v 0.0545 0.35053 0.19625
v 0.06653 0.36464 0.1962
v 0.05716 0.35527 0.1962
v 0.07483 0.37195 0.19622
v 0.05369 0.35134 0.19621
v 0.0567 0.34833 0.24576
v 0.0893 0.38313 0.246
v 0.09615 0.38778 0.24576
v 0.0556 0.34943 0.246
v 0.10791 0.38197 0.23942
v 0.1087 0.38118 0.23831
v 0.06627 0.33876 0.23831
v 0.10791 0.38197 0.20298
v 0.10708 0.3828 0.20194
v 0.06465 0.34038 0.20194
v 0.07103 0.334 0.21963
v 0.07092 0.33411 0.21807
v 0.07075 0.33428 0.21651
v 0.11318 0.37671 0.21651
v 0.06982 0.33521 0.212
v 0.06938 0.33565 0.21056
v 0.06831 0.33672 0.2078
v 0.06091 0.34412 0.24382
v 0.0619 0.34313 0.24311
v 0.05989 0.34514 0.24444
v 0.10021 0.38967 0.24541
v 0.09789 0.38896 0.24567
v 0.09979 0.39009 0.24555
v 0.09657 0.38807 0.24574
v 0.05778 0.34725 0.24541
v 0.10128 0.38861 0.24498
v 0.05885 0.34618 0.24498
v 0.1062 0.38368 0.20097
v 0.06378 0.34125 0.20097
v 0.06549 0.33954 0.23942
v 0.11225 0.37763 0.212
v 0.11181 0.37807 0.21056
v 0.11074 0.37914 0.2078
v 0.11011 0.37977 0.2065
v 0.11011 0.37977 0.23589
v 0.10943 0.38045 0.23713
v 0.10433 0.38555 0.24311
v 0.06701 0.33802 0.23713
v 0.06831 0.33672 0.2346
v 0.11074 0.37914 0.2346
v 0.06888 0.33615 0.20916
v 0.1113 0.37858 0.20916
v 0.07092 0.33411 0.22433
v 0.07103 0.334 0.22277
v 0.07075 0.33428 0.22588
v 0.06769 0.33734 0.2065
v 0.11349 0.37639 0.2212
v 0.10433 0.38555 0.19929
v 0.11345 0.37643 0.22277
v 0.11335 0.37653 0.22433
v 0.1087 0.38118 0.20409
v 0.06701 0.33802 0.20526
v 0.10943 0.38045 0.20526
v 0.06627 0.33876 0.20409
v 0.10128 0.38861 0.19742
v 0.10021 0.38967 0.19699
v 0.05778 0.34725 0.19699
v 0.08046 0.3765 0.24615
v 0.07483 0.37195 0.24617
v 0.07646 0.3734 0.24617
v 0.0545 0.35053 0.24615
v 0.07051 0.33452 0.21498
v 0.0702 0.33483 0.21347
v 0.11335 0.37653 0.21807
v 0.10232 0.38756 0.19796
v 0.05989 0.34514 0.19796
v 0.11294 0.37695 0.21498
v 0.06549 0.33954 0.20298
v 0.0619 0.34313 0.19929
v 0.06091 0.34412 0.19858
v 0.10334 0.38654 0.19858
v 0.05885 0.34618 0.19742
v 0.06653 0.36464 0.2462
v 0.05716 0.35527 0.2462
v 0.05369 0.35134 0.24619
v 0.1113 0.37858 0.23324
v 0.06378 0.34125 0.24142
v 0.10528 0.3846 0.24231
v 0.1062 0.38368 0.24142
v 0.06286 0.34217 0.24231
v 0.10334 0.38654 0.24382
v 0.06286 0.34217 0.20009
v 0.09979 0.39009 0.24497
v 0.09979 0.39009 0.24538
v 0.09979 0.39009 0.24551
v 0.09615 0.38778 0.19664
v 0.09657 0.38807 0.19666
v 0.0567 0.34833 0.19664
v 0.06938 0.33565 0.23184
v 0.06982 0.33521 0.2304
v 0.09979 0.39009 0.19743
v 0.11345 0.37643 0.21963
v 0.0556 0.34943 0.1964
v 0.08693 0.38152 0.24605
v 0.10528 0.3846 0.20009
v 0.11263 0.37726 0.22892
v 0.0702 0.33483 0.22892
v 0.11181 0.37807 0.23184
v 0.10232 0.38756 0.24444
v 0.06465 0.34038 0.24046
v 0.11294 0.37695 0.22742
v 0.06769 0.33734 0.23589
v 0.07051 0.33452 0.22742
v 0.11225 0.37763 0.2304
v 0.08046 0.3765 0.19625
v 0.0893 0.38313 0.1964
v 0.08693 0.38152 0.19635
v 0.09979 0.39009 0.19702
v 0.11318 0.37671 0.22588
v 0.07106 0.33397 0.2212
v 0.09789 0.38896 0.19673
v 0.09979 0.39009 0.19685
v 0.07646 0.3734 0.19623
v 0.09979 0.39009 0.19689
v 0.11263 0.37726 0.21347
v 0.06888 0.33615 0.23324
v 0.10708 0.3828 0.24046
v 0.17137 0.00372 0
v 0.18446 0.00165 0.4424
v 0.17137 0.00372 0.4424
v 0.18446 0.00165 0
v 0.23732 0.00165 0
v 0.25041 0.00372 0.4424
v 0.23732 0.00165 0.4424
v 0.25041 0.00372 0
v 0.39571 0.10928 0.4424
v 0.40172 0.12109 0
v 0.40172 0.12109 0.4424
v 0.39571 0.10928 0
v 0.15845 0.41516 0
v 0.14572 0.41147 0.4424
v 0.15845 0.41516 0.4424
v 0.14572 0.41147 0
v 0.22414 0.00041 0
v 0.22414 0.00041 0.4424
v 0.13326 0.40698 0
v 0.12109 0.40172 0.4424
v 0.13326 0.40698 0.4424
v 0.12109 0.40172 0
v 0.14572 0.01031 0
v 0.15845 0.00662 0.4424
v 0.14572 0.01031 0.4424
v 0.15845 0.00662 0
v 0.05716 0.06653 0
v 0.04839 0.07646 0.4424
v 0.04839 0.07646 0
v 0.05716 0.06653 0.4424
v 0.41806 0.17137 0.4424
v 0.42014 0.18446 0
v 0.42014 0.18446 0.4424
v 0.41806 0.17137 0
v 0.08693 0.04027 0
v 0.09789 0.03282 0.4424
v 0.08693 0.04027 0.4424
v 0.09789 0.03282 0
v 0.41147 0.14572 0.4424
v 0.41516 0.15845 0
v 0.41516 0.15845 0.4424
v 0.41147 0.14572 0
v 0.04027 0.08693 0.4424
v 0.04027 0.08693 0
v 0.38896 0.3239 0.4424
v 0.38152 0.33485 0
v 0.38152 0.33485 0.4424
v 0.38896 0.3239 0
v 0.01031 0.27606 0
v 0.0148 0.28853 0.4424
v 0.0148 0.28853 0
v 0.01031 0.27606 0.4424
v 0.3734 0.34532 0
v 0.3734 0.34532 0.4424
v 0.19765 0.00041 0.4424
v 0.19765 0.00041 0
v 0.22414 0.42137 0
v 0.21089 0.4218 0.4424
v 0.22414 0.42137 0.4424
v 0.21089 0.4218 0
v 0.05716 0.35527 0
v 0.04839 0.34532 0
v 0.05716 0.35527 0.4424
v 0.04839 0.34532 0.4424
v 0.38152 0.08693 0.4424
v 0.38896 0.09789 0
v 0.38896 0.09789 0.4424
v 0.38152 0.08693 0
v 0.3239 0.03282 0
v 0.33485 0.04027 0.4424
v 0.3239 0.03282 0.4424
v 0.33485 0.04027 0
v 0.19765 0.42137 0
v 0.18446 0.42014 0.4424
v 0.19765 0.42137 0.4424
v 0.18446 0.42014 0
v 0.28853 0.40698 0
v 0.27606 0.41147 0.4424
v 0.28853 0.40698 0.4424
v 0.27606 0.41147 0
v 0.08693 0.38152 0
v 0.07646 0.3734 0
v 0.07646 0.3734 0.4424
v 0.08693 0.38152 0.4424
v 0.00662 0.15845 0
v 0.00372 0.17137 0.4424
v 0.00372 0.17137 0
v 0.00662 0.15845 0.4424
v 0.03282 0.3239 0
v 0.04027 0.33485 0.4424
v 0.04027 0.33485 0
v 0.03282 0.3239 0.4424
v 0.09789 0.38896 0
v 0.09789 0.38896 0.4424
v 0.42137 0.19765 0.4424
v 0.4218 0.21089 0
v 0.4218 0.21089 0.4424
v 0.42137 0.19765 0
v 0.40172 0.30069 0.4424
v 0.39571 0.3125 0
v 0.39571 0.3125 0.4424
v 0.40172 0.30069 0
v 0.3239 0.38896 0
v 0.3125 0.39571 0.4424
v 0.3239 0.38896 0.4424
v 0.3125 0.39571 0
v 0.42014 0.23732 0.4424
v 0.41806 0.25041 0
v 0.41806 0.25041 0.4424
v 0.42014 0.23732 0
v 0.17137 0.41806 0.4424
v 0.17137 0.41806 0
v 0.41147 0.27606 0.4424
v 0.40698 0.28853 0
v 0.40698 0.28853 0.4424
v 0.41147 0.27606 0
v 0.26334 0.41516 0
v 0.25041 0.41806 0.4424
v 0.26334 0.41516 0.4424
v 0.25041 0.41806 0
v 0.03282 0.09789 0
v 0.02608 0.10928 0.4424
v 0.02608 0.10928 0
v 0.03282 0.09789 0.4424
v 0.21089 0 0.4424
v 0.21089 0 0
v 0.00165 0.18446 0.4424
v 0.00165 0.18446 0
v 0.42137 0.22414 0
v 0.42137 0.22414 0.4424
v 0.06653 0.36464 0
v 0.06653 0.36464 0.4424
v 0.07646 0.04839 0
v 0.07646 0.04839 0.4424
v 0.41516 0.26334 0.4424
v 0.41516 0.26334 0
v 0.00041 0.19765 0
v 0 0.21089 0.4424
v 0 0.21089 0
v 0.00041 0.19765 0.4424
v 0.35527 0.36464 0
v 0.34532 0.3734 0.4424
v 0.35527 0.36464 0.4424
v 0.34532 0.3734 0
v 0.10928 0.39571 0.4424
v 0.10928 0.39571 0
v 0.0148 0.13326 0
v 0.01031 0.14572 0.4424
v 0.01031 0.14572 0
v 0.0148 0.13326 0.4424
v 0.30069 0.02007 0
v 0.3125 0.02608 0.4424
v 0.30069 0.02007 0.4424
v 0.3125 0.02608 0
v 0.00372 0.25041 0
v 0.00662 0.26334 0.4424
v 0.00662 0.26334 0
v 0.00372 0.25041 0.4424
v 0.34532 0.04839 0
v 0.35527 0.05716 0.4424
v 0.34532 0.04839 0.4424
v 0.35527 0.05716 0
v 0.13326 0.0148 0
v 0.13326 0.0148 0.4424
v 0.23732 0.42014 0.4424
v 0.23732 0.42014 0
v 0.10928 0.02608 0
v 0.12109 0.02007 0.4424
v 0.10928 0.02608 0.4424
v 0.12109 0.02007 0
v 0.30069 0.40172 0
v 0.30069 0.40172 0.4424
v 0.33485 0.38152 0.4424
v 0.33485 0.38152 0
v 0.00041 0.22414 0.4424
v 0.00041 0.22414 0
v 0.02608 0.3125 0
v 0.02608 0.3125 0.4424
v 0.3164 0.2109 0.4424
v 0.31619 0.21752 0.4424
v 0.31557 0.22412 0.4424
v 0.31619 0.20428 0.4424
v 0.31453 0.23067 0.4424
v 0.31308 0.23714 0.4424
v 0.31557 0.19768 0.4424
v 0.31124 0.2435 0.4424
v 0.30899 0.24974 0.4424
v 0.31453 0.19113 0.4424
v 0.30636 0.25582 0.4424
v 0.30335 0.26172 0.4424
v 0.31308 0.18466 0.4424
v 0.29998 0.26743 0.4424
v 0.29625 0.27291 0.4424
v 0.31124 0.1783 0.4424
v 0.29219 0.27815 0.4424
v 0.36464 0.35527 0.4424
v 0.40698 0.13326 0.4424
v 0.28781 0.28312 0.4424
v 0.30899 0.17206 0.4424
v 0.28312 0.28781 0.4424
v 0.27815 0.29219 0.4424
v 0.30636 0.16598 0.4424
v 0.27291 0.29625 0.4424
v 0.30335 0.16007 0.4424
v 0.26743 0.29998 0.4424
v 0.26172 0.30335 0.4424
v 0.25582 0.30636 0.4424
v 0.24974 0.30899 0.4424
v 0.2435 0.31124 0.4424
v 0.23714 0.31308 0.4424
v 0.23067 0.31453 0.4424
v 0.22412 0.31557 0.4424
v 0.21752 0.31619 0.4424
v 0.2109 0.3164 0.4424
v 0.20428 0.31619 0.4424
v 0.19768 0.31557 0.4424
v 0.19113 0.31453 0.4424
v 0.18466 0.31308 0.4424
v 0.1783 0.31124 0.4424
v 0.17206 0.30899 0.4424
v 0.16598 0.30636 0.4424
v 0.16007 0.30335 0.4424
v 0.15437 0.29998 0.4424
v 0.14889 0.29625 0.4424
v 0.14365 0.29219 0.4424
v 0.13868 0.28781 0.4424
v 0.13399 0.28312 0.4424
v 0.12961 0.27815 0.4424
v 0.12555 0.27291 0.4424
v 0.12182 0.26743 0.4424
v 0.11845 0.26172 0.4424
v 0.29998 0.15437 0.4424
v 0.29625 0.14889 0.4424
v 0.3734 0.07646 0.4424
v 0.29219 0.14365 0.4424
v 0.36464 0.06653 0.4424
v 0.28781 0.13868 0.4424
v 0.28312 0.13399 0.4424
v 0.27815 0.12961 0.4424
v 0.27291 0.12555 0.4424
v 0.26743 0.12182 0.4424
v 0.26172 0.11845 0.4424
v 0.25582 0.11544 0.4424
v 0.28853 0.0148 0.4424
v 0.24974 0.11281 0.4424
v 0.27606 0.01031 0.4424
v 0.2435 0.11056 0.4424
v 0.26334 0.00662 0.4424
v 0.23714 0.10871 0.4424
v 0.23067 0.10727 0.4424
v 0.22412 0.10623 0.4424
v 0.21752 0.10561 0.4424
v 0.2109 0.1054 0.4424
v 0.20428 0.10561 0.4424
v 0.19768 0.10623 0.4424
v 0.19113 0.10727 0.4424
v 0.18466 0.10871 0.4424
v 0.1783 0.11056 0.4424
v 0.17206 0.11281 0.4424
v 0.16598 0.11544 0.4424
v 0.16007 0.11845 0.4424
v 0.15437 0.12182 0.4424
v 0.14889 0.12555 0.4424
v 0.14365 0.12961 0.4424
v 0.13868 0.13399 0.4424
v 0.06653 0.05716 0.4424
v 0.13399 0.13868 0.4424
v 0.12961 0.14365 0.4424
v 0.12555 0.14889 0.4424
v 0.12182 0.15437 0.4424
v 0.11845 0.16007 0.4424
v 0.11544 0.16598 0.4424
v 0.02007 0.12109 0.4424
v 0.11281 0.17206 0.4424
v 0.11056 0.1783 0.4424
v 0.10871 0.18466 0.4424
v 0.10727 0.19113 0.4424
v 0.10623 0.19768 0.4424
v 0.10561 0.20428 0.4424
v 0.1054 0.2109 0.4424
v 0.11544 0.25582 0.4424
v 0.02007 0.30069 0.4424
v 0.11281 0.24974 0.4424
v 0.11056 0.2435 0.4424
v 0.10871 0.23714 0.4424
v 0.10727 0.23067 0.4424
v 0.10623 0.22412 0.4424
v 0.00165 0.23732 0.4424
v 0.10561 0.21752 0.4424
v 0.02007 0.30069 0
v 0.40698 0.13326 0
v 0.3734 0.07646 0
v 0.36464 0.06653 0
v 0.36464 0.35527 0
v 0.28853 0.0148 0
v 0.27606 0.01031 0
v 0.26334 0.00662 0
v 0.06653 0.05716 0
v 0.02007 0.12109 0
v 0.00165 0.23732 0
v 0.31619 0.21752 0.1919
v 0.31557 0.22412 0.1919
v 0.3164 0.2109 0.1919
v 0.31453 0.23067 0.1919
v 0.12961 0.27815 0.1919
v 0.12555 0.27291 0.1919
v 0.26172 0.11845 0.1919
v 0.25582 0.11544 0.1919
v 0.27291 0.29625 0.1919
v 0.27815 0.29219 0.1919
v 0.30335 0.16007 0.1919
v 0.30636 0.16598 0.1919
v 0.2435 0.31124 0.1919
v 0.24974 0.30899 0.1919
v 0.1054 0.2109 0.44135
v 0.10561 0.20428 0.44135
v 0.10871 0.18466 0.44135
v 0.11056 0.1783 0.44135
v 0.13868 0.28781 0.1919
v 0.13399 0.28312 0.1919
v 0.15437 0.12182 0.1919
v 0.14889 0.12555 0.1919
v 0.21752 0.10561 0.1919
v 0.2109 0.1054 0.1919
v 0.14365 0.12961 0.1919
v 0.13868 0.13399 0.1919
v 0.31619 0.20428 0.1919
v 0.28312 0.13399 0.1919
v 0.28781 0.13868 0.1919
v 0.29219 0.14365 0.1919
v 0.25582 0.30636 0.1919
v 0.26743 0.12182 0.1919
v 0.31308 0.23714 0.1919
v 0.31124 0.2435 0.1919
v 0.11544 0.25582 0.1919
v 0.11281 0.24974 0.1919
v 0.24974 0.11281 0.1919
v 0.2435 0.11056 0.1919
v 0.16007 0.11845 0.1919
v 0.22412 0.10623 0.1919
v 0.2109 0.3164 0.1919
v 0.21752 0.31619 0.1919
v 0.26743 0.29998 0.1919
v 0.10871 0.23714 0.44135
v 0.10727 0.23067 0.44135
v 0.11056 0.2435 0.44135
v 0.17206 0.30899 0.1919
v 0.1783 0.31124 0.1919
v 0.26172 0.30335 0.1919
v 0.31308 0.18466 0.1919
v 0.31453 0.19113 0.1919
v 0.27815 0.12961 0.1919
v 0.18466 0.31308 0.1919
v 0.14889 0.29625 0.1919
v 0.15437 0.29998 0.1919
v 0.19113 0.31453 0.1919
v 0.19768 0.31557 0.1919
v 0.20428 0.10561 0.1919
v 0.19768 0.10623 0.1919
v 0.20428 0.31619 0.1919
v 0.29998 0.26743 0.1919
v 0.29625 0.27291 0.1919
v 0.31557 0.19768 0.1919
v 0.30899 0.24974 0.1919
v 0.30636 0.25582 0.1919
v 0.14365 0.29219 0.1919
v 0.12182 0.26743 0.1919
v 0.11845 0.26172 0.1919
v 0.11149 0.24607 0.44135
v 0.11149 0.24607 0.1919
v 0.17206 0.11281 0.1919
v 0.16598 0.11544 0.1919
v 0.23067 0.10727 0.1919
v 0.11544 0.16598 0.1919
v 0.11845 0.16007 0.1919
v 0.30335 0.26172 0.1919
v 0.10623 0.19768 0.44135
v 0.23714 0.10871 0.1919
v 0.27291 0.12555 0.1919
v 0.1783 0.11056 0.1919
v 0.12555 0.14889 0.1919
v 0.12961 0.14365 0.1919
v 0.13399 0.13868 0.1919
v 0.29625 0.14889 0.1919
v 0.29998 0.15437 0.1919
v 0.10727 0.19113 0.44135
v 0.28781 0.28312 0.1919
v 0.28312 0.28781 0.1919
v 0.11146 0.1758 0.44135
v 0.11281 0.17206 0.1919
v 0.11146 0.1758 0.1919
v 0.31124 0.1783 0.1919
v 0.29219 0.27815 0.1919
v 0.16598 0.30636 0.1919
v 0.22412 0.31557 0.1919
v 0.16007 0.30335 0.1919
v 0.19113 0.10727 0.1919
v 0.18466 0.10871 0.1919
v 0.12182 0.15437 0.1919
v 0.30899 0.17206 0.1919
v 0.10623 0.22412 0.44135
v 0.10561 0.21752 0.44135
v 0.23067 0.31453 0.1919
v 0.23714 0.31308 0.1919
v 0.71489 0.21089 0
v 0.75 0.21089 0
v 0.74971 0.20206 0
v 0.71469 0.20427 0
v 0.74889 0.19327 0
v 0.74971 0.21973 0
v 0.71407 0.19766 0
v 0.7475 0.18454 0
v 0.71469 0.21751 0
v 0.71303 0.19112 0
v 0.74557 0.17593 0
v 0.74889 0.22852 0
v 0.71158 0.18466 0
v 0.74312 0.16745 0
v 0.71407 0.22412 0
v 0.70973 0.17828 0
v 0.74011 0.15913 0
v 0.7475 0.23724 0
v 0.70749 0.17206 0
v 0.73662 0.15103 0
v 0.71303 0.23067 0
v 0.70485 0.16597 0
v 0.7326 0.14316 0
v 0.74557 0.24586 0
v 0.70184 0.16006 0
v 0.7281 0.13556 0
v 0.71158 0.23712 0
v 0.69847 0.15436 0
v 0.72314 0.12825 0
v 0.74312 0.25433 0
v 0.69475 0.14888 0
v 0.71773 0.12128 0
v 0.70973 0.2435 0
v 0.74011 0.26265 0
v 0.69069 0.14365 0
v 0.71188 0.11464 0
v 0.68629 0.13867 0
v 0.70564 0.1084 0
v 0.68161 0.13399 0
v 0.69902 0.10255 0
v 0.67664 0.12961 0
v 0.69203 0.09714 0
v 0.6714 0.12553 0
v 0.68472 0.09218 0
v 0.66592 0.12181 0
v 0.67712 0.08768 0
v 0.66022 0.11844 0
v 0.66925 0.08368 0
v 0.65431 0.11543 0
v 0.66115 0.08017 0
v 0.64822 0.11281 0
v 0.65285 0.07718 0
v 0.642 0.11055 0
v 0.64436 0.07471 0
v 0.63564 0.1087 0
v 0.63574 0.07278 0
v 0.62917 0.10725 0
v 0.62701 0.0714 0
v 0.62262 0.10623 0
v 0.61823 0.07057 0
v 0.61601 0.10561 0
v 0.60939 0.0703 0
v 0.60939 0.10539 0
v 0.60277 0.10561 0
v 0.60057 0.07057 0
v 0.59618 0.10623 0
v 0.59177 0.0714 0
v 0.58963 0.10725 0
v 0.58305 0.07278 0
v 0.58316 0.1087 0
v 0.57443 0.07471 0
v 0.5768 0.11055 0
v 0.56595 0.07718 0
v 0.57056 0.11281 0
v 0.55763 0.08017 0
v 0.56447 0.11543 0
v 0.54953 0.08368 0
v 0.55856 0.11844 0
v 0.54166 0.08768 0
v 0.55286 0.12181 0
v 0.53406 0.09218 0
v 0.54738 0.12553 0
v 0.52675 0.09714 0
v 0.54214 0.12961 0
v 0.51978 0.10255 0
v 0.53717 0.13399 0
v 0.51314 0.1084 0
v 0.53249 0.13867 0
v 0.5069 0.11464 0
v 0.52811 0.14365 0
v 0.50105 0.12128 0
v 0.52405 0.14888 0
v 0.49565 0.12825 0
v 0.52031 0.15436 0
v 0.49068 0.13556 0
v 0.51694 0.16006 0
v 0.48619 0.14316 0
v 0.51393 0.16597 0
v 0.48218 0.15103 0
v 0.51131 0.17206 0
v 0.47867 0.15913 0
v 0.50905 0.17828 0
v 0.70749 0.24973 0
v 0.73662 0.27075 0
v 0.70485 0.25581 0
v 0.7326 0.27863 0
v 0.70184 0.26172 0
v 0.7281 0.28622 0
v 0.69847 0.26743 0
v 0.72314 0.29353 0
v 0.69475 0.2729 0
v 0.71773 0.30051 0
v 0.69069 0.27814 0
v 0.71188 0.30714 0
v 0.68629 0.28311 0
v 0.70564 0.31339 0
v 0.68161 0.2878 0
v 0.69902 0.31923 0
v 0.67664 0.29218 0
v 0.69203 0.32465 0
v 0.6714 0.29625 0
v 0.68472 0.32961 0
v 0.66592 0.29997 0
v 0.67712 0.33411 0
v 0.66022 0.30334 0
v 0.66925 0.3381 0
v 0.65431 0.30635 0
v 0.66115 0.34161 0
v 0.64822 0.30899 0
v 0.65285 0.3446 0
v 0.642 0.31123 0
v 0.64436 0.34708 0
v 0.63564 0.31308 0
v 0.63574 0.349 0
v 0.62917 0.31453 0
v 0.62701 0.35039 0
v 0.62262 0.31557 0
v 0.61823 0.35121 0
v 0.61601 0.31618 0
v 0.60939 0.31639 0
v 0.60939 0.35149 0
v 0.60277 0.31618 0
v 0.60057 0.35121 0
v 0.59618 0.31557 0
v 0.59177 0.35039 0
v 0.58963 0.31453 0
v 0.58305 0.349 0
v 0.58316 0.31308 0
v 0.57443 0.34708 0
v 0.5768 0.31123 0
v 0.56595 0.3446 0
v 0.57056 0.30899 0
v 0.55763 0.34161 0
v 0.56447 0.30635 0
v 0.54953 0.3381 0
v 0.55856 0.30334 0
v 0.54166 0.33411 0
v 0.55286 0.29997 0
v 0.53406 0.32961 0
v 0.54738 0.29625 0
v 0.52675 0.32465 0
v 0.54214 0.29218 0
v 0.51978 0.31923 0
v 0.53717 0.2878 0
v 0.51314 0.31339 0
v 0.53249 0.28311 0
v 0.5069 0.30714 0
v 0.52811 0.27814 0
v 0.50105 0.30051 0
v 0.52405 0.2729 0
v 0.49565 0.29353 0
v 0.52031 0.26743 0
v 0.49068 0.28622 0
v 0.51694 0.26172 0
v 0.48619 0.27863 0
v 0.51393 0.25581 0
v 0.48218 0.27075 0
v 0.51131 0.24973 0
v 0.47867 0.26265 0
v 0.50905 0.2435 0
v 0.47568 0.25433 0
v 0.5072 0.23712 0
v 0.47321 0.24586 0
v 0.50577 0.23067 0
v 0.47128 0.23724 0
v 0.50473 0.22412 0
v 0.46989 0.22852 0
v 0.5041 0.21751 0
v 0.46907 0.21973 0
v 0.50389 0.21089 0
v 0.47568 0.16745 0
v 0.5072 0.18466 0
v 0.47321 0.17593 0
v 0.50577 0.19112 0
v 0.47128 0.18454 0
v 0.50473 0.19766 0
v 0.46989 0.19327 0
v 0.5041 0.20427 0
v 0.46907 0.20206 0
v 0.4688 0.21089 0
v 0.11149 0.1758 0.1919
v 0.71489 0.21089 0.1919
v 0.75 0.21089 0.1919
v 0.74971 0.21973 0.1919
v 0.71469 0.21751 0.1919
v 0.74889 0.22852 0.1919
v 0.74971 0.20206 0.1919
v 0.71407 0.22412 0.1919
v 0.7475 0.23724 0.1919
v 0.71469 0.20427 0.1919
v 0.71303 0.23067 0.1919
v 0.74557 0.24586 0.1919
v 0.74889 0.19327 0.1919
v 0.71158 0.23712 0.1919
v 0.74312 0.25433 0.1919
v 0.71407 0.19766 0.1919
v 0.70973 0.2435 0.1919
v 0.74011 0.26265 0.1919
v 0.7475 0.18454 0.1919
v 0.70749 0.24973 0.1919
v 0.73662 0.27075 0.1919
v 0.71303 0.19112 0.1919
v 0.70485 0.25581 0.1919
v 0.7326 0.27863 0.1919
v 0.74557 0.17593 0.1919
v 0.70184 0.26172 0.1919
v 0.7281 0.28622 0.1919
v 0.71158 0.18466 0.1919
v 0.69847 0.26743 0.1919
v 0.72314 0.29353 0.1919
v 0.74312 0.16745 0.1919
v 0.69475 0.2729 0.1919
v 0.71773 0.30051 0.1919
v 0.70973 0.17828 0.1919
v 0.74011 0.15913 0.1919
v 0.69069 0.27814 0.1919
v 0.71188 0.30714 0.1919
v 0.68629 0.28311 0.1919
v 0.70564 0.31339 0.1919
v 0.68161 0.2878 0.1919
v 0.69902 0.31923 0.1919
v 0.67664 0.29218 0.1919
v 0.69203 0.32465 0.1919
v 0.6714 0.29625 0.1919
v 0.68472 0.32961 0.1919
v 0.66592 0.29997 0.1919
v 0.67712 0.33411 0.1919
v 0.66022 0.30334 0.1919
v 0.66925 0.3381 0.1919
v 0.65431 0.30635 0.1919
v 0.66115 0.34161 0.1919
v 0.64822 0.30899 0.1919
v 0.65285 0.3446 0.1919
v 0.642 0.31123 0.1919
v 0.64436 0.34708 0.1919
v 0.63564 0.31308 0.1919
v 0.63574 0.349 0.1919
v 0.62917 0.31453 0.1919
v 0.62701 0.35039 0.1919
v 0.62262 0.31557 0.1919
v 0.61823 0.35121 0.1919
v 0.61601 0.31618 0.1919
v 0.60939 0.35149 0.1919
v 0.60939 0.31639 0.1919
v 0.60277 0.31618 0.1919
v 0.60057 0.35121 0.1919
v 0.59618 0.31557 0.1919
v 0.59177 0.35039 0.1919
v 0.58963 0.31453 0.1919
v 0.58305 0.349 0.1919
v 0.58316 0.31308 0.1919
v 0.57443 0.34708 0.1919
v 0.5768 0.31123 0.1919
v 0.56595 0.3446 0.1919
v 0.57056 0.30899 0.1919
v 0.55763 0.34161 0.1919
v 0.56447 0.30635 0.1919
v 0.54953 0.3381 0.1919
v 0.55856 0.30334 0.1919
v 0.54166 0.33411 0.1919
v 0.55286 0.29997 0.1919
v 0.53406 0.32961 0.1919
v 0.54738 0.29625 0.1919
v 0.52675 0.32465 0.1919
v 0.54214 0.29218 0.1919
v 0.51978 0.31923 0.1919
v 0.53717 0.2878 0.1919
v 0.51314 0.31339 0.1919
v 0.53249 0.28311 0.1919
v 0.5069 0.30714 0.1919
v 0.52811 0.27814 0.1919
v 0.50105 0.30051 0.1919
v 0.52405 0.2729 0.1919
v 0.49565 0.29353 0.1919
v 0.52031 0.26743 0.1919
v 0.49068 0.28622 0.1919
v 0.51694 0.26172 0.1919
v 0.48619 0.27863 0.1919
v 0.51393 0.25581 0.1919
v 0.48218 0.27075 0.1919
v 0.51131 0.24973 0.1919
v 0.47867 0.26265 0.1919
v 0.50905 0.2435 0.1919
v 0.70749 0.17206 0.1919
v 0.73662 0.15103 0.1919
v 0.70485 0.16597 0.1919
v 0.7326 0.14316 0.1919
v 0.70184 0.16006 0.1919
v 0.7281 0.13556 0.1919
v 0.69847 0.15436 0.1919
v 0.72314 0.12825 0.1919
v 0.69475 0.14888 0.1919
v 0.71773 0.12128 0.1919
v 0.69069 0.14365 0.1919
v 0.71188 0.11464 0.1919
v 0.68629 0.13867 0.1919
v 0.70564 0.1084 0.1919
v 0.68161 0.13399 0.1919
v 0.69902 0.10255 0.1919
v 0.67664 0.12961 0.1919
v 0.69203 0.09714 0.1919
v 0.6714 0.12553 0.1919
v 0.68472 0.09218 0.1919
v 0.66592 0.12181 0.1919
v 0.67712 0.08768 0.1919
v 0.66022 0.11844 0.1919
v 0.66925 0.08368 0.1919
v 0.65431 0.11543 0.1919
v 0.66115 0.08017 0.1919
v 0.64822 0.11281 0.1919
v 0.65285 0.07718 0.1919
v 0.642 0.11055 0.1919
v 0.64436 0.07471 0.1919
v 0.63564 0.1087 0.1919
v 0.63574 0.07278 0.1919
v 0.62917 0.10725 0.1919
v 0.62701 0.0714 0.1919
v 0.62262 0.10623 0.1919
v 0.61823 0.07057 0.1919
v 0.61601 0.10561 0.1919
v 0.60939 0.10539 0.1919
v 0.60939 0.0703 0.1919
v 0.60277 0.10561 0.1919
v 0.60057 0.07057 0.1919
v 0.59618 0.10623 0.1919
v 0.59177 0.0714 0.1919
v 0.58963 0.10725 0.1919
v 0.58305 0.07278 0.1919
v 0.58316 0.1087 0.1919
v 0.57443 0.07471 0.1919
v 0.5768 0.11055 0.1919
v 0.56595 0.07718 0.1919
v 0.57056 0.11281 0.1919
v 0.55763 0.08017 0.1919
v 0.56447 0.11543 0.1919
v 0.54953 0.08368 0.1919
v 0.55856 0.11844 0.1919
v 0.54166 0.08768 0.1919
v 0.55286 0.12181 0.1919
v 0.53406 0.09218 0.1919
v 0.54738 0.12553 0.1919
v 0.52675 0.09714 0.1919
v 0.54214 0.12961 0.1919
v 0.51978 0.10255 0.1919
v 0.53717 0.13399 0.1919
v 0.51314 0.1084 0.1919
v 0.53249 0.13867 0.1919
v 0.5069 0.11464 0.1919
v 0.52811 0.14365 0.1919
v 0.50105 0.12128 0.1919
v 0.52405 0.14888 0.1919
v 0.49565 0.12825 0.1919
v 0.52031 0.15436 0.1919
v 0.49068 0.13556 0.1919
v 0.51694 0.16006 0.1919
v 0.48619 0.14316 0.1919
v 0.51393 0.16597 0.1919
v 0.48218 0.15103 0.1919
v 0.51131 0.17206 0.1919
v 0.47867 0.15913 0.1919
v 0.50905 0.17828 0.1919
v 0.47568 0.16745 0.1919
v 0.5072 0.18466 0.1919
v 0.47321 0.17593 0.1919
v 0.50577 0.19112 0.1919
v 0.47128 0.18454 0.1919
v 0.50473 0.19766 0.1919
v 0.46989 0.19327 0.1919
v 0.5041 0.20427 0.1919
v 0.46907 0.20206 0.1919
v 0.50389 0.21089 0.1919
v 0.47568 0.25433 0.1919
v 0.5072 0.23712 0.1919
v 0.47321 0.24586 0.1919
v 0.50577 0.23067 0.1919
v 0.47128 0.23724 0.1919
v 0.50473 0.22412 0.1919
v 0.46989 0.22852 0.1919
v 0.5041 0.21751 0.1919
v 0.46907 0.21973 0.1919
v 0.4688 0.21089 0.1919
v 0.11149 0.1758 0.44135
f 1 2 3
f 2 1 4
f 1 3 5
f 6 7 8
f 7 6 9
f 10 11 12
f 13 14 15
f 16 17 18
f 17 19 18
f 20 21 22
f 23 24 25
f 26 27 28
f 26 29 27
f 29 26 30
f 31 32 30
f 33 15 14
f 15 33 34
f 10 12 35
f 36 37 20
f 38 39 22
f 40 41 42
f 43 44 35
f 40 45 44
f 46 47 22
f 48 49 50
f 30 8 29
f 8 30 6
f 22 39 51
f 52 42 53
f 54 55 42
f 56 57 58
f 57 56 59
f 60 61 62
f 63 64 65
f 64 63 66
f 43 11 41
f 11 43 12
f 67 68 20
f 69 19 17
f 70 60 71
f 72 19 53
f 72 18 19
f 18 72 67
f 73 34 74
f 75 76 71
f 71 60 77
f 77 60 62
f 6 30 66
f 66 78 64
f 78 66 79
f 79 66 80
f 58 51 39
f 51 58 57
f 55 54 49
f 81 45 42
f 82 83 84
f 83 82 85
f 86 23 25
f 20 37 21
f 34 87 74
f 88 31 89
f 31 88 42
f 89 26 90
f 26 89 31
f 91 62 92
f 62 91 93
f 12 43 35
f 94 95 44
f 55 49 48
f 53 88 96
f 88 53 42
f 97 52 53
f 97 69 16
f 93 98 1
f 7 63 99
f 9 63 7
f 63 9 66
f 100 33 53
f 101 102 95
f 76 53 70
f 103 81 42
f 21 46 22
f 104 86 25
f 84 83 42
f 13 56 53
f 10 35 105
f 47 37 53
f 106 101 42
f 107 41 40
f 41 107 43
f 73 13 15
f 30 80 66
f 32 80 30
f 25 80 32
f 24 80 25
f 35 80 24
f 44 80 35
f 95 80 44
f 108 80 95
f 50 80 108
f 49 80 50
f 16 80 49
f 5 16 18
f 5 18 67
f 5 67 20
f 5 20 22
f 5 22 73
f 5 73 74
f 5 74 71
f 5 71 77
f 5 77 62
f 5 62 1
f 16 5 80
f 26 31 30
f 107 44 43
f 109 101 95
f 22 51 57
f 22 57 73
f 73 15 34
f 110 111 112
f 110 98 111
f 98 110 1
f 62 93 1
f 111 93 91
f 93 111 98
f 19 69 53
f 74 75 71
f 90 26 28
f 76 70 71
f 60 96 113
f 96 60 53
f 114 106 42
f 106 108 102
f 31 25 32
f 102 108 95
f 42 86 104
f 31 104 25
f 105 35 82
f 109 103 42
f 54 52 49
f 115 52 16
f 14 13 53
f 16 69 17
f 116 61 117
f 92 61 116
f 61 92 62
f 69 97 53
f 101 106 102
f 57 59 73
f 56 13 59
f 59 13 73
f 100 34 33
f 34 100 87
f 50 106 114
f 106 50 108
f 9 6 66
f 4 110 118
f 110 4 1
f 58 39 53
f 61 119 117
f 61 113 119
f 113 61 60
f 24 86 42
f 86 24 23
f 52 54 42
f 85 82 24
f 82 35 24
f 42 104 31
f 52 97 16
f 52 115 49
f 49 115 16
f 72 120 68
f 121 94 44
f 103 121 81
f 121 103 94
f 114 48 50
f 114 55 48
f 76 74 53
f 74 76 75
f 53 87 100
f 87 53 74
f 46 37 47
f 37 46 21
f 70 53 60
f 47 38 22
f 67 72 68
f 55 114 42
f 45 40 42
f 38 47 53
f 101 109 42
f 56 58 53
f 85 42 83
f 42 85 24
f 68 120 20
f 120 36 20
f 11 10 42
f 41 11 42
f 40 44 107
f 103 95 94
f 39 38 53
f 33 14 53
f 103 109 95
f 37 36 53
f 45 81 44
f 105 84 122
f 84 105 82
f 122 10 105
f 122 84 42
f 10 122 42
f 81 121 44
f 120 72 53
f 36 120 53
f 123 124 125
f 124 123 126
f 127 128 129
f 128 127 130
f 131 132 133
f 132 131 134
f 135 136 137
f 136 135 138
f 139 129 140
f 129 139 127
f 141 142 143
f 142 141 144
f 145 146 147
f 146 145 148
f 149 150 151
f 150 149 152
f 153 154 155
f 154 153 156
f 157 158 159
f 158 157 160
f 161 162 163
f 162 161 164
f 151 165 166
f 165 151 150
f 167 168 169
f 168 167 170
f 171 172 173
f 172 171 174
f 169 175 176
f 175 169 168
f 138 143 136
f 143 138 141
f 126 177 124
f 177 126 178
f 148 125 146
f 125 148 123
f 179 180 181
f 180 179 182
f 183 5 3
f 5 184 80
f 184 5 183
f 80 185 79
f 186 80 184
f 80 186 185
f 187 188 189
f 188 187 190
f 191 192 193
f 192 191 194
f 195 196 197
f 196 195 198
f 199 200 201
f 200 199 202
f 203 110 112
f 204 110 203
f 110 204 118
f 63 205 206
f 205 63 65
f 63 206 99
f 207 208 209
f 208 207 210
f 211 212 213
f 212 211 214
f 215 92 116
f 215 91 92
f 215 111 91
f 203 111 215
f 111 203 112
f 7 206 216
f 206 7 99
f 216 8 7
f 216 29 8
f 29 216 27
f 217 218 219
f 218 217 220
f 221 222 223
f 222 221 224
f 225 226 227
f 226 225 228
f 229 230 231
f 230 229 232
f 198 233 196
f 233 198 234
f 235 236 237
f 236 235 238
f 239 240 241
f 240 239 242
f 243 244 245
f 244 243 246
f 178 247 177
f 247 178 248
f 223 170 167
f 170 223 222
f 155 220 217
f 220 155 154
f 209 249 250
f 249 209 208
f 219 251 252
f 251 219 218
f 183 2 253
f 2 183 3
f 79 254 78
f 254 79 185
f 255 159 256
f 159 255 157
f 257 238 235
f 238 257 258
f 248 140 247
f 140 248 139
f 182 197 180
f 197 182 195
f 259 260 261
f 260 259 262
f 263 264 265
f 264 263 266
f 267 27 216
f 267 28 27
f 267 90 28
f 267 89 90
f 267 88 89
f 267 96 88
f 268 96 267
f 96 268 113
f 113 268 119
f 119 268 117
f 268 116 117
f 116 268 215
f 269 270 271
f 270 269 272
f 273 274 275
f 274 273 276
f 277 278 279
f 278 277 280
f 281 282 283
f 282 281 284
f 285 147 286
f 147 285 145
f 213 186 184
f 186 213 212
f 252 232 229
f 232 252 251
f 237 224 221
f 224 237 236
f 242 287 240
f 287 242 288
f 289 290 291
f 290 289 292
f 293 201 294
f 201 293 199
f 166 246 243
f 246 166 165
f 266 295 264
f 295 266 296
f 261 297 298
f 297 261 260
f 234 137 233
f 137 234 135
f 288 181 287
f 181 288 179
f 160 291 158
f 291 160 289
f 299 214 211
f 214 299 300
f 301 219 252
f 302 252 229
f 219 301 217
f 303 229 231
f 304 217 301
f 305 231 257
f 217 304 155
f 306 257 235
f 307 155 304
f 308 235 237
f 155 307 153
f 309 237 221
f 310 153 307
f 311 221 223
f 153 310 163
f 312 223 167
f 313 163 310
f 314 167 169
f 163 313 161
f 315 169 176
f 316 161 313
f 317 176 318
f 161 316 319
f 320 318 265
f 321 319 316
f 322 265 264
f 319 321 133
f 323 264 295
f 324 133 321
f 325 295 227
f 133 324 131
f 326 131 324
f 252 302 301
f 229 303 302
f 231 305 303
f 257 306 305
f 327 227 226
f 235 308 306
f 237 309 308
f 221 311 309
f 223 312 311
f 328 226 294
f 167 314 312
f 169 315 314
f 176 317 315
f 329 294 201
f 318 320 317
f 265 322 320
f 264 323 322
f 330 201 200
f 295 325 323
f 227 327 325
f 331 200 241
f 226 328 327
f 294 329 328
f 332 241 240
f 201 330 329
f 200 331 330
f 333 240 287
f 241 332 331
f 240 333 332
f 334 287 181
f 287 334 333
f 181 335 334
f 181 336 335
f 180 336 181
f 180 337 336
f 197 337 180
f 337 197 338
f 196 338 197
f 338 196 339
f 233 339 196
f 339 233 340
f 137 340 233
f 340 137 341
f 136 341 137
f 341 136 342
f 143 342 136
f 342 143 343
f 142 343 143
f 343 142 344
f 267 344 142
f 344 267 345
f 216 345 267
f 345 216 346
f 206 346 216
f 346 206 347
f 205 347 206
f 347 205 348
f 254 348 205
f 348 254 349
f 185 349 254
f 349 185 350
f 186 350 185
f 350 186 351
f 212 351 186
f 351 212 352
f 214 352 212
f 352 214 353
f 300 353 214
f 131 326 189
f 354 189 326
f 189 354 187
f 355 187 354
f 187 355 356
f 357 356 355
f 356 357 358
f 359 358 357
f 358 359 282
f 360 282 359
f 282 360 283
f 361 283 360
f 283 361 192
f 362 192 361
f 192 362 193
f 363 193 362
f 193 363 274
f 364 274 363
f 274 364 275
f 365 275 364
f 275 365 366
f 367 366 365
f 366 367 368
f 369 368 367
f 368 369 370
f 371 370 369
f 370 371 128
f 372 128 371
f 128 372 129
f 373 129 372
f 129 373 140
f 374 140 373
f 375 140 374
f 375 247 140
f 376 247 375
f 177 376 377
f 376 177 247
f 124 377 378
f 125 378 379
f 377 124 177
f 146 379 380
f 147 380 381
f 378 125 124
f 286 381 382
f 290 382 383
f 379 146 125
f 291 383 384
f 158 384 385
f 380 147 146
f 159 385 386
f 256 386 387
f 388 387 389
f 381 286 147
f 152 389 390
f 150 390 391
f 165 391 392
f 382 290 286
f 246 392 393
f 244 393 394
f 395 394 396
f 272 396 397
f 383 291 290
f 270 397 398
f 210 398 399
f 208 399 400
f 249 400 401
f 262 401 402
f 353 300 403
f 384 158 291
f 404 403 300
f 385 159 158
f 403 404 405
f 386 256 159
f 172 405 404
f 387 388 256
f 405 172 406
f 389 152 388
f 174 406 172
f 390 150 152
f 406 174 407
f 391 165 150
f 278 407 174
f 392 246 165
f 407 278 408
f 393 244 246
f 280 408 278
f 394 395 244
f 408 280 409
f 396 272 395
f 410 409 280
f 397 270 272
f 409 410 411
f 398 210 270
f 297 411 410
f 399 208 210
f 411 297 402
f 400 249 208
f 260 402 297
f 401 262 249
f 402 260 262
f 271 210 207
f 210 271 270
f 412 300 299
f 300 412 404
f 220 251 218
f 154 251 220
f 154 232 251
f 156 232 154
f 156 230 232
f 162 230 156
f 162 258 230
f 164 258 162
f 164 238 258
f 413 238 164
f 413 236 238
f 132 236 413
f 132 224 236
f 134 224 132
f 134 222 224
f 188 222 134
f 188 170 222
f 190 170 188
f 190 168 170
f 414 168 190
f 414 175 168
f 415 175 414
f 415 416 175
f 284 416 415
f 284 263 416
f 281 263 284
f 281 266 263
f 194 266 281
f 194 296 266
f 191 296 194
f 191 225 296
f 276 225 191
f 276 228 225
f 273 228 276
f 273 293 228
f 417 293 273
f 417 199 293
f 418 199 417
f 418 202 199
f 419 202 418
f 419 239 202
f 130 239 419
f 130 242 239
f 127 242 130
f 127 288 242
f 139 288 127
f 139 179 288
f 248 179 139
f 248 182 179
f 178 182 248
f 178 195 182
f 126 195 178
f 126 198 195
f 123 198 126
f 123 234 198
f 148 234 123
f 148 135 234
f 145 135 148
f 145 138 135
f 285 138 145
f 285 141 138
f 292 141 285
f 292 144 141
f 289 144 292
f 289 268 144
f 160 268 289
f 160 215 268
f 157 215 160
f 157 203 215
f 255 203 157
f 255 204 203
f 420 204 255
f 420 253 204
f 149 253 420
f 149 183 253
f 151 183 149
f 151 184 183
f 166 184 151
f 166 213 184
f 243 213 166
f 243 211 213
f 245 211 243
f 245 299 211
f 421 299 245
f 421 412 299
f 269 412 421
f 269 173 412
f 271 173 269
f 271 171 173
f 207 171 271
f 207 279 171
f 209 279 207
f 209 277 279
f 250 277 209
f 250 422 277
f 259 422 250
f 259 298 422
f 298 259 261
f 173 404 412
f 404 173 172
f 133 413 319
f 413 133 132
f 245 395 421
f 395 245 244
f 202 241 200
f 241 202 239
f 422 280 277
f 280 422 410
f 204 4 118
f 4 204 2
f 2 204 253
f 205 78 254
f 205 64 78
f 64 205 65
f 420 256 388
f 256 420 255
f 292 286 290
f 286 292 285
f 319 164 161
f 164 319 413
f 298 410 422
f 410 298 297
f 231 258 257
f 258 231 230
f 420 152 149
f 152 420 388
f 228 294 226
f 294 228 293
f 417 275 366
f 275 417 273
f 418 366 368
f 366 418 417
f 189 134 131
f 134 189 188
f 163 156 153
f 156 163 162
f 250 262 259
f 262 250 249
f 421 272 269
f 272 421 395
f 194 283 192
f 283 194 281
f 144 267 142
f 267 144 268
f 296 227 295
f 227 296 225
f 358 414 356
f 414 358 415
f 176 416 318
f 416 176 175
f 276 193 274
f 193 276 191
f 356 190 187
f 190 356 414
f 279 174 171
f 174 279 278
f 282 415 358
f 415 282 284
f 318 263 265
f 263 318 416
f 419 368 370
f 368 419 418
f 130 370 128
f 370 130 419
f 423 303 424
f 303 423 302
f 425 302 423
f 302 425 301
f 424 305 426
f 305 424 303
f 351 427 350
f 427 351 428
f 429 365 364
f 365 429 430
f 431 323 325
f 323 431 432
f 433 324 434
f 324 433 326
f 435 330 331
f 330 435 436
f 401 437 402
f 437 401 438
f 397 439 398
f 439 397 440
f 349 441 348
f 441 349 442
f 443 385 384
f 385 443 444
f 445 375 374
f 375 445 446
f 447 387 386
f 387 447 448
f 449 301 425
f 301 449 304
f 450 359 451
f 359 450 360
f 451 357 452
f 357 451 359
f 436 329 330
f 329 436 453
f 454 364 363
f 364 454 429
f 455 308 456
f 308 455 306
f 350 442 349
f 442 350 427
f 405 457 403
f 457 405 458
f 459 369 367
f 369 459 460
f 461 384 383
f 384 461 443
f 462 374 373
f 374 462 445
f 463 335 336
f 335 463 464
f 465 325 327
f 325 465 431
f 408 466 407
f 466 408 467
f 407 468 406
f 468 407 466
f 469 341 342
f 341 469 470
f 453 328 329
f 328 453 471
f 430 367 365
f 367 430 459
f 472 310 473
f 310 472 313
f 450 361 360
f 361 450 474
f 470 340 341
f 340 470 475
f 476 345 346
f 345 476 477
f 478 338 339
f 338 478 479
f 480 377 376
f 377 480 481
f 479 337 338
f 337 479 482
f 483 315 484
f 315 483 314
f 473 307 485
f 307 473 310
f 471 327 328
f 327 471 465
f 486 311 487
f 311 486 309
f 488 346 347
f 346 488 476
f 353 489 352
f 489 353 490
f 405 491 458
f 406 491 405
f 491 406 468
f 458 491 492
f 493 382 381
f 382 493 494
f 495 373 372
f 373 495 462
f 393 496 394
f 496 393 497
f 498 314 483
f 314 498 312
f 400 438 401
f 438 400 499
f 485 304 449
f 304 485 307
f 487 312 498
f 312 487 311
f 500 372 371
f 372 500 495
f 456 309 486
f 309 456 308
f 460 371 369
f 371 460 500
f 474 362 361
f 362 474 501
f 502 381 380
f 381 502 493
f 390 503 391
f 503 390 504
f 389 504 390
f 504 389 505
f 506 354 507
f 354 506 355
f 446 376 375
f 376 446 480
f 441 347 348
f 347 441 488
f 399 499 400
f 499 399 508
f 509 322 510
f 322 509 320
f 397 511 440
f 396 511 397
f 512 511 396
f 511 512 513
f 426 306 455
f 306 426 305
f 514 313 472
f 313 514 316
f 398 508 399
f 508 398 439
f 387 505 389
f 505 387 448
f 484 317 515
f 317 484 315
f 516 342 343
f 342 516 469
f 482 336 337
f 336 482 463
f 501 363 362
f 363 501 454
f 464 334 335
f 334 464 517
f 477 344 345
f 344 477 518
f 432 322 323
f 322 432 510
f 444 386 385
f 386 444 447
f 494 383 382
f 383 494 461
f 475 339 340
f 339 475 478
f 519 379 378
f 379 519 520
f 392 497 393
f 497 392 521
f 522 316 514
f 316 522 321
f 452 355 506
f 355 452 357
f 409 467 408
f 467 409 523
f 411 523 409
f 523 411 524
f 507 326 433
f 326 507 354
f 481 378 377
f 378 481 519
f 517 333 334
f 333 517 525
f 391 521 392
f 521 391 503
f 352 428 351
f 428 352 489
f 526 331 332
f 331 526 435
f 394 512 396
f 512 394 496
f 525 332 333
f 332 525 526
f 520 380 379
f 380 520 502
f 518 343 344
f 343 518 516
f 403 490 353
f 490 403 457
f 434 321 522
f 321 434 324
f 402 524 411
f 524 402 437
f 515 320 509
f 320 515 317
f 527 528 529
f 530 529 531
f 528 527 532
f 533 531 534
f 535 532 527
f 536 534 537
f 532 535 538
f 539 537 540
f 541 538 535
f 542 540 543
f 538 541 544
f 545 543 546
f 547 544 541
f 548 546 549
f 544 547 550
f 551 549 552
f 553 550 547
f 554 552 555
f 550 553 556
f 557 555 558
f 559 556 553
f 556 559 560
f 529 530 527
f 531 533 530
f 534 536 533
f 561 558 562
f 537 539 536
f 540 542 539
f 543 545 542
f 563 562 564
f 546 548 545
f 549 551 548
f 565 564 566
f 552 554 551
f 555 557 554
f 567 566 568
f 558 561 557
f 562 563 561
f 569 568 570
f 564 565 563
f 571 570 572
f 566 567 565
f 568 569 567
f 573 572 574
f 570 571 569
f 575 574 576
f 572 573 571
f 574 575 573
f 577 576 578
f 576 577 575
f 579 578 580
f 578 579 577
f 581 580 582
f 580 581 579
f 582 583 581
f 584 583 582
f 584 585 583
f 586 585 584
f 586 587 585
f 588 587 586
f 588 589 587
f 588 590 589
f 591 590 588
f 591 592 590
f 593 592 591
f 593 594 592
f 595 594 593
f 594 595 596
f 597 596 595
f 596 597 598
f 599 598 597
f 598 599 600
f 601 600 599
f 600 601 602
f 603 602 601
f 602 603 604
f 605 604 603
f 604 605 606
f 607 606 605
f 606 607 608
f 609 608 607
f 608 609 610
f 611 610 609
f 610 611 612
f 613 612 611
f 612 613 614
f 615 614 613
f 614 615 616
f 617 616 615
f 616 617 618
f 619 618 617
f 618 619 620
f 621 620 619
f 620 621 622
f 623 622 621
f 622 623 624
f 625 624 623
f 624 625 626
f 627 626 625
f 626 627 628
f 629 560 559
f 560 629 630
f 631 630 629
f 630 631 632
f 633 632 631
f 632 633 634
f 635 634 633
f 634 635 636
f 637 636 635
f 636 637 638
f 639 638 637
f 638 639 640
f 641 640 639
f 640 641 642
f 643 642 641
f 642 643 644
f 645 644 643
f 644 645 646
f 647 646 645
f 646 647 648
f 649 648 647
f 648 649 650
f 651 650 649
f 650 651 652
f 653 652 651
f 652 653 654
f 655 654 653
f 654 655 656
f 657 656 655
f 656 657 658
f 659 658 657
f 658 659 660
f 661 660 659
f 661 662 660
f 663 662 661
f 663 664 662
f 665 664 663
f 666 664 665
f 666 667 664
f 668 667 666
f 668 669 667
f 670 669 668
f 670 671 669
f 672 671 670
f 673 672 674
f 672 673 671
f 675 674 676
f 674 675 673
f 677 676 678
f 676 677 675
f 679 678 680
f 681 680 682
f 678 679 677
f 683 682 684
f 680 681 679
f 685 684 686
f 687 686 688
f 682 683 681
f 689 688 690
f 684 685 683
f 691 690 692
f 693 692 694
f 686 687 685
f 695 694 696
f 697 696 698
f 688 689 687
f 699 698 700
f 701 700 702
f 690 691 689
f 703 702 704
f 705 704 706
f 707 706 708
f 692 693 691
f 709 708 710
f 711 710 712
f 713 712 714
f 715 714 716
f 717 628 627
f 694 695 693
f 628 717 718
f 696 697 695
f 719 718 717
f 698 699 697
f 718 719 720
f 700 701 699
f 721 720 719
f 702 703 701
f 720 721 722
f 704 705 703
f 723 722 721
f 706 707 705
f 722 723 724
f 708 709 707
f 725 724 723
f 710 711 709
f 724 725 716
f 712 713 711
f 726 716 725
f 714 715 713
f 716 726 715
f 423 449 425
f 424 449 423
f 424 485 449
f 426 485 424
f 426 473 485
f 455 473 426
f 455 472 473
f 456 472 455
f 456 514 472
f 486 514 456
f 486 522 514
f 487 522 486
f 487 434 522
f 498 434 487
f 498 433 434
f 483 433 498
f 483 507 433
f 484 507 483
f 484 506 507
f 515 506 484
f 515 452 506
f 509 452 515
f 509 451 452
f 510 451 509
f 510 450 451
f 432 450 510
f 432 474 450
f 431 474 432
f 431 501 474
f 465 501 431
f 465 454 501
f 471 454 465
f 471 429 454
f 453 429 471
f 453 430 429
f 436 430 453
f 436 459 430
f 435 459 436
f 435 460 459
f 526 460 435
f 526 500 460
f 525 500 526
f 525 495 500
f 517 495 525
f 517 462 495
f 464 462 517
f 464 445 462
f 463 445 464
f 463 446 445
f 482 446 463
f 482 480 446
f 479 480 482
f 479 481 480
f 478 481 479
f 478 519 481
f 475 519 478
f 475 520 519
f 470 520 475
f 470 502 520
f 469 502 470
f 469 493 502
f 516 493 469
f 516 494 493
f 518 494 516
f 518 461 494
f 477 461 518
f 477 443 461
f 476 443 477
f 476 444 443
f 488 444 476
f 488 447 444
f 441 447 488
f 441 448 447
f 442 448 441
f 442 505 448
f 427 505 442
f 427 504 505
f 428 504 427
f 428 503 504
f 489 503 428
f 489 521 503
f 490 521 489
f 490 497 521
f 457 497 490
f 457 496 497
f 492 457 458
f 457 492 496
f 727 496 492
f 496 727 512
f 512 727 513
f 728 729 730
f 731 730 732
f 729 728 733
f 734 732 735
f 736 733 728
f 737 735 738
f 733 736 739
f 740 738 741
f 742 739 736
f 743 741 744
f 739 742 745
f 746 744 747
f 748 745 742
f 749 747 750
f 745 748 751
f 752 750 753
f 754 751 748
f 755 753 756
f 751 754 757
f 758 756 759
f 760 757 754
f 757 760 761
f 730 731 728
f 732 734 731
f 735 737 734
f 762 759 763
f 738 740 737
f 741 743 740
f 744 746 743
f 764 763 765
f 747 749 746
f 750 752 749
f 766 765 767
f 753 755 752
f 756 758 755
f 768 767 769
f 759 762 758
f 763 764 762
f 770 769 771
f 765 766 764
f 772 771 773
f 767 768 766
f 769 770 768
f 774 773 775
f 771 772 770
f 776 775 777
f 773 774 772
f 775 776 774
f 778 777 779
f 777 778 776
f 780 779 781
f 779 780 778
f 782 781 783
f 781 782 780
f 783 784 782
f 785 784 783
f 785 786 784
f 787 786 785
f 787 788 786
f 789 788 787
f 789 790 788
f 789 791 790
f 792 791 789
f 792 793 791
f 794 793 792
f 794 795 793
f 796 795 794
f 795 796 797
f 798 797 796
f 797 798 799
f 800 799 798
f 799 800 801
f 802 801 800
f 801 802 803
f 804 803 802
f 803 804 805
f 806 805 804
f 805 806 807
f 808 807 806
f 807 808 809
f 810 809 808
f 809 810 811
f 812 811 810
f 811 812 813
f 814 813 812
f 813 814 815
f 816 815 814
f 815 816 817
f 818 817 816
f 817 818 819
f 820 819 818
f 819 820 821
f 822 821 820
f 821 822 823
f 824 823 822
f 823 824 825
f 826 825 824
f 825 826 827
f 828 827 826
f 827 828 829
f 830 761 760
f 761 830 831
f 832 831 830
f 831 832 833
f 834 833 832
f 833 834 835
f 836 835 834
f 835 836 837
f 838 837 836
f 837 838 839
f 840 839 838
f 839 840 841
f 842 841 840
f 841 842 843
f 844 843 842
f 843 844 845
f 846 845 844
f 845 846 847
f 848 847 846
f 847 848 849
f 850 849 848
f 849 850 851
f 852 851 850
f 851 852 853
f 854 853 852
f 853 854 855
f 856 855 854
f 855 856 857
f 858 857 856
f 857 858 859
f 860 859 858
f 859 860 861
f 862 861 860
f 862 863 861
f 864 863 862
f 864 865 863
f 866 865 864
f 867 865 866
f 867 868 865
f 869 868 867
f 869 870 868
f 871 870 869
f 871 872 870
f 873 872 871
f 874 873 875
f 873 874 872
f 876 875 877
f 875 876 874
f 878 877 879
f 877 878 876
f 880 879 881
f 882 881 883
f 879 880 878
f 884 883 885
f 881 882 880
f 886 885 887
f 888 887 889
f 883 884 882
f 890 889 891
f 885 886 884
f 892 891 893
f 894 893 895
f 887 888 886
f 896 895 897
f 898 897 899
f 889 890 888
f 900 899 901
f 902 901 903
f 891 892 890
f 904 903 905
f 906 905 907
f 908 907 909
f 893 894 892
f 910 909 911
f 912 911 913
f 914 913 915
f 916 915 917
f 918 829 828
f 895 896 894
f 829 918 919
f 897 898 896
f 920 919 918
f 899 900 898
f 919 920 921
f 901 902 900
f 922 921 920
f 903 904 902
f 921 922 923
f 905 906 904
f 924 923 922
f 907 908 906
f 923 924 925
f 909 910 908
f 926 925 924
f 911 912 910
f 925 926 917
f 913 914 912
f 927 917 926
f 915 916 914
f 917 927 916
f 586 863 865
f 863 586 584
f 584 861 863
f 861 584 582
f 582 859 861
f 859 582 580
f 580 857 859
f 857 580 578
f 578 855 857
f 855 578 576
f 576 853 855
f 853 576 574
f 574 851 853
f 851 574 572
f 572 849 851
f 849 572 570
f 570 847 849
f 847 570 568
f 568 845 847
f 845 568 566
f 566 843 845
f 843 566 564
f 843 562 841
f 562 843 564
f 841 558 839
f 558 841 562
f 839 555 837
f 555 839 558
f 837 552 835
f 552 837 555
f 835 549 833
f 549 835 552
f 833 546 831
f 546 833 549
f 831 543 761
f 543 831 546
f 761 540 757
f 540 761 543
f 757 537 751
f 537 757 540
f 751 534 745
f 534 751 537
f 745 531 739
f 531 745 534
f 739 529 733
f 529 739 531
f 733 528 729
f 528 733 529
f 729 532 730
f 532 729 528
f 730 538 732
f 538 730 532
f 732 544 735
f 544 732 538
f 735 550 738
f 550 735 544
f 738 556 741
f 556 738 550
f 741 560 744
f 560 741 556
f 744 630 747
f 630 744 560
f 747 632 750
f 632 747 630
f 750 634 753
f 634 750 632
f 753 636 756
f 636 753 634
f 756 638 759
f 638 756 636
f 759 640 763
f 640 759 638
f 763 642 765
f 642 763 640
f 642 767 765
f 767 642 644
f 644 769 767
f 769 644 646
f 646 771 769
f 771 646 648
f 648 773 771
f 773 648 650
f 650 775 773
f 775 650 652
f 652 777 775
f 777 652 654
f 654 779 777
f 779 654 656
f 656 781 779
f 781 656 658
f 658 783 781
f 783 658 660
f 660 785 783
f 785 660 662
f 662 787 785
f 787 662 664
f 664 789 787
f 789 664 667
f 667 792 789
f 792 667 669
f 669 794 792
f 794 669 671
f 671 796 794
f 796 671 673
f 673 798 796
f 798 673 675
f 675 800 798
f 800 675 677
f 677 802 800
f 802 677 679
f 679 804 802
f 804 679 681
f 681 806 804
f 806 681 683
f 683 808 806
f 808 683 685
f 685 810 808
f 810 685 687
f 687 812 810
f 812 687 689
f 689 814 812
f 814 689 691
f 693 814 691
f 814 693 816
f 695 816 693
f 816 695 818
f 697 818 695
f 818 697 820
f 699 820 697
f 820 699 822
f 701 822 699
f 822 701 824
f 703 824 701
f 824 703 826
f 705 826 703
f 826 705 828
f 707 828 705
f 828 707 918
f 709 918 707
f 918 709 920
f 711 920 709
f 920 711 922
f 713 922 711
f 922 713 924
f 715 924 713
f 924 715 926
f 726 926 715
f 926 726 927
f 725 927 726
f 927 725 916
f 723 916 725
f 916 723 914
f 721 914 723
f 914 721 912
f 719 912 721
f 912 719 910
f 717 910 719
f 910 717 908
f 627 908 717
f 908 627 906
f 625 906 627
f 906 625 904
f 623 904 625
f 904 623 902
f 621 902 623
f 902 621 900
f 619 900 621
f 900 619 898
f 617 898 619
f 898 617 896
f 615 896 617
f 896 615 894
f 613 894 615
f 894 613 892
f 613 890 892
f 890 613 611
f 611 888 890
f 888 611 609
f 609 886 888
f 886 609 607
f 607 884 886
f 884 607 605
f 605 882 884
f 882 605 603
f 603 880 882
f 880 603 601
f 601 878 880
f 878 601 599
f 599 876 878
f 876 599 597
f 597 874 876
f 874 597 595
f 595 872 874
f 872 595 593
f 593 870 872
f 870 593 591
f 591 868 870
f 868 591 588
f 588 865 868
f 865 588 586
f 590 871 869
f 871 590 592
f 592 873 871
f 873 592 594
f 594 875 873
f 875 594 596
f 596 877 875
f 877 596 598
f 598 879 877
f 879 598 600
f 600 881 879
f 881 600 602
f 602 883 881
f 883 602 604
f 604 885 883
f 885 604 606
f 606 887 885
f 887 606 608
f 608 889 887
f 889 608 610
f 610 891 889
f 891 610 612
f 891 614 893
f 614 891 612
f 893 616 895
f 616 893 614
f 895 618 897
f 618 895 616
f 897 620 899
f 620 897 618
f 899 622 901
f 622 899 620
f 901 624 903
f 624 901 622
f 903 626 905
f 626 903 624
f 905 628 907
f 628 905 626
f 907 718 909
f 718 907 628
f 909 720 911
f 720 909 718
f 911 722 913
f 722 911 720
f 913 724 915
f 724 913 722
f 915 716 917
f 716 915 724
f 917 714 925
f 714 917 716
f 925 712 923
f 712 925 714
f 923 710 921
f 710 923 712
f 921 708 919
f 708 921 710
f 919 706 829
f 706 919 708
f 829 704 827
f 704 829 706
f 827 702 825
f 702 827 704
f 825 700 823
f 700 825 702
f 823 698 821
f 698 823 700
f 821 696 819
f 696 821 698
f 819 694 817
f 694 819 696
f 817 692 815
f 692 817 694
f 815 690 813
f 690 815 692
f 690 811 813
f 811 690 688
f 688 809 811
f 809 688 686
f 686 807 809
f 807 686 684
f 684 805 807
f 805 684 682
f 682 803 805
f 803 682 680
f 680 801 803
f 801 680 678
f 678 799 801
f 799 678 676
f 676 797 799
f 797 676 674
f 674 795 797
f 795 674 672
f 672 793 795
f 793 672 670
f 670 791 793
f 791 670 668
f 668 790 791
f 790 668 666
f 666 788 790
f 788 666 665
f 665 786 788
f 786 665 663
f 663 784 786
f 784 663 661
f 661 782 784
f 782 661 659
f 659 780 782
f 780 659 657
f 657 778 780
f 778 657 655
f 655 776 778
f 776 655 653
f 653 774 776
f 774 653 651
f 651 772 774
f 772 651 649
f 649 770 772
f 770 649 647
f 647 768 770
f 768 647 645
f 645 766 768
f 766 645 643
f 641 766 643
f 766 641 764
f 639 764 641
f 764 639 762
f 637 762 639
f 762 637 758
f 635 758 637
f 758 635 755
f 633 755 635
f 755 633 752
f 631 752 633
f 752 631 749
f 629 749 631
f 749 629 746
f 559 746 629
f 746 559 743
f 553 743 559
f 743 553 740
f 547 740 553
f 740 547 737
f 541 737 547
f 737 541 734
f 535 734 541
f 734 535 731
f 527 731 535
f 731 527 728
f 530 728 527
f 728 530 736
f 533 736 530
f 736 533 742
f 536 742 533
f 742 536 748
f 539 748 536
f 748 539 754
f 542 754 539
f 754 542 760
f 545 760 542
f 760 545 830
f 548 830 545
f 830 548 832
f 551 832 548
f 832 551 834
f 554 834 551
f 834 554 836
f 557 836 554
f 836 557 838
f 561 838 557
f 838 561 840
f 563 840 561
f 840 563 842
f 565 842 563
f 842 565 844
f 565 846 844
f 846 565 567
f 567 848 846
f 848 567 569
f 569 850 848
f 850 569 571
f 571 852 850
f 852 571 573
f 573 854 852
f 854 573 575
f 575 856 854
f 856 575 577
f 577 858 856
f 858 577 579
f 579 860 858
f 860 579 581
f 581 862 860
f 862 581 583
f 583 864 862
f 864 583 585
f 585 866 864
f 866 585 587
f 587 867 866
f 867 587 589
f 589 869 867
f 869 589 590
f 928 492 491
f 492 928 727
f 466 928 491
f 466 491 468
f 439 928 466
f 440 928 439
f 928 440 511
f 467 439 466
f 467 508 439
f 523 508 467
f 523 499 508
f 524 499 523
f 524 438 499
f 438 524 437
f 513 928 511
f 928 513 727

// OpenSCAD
// Base datum envelope
base_length = 0.75;
base_width = 0.421875;
base_height = 0.1919;

// Left circular profile (solid disk)
left_cx = 0.2109;
left_cy = 0.2109;
left_r = 0.2109;

// Right concentric circular group (annulus)
right_cx = 0.6094;
right_cy = 0.2109;
right_outer_r = 0.1406;
right_inner_r = 0.1055;

// Upper taller circular section over left-side axis
upper_height = 0.4424;
upper_footprint_w = 0.4218;
upper_footprint_d = 0.4218;
upper_left = 0;
upper_right = 0.3282;
upper_front = 0;
upper_back = 0;
upper_inner_r = right_inner_r; // inner loop void preserved through full height

// Rectangular upright tab
tab_length = 0.041188;
tab_width = 0.070313;
tab_height = 0.441346;
tab_left = 0.0703;
tab_front = 0.1758;

// Curved surface resolution
$fn = 100;

// Lower base 2D sketch formed from separate rounded profiles
module lower_profile() {
    union() {
        // Left solid circular profile within full span
        translate([left_cx, left_cy])
            circle(r = left_r);

        // Right annular profile group (outer boundary with true inner void)
        difference() {
            translate([right_cx, right_cy])
                circle(r = right_outer_r);
            translate([right_cx, right_cy])
                circle(r = right_inner_r);
        }
    }
}

// Upper section 2D profile bounded by explicit footprint
module upper_profile() {
    intersection() {
        translate([upper_left, upper_front])
            square([upper_footprint_w, upper_footprint_d]);
        translate([left_cx, left_cy])
            circle(r = left_r);
    }
}

// Rounded slot-like interruptions for annular openings
module opening_slots(h) {
    // Radial slot cuts intersecting the inner loop
    for (a = [45 : 90 : 315])
        rotate([0, 0, a])
            translate([left_cx + upper_inner_r, left_cy, h / 2])
                rotate([0, 90, 0])
                    cylinder(h = 0.06, r = 0.025, center = true, $fn = $fn);
}

// Main assembly
union() {
    // Lower base extruded from base datum
    linear_extrude(height = base_height, convexity = 4)
        lower_profile();

    // Upper circular section: taller continuation from same datum
    difference() {
        linear_extrude(height = upper_height, convexity = 4)
            upper_profile();

        // Inner loop void making section annular where present
        translate([left_cx, left_cy, -0.01])
            cylinder(h = upper_height + 0.02, r = upper_inner_r, $fn = $fn);

        // Rounded slot-like interruptions preserved as true voids
        opening_slots(upper_height);
    }

    // Separate solid rectangular upright tab
    translate([tab_left, tab_front, 0])
        cube([tab_length, tab_width, tab_height]);
}
